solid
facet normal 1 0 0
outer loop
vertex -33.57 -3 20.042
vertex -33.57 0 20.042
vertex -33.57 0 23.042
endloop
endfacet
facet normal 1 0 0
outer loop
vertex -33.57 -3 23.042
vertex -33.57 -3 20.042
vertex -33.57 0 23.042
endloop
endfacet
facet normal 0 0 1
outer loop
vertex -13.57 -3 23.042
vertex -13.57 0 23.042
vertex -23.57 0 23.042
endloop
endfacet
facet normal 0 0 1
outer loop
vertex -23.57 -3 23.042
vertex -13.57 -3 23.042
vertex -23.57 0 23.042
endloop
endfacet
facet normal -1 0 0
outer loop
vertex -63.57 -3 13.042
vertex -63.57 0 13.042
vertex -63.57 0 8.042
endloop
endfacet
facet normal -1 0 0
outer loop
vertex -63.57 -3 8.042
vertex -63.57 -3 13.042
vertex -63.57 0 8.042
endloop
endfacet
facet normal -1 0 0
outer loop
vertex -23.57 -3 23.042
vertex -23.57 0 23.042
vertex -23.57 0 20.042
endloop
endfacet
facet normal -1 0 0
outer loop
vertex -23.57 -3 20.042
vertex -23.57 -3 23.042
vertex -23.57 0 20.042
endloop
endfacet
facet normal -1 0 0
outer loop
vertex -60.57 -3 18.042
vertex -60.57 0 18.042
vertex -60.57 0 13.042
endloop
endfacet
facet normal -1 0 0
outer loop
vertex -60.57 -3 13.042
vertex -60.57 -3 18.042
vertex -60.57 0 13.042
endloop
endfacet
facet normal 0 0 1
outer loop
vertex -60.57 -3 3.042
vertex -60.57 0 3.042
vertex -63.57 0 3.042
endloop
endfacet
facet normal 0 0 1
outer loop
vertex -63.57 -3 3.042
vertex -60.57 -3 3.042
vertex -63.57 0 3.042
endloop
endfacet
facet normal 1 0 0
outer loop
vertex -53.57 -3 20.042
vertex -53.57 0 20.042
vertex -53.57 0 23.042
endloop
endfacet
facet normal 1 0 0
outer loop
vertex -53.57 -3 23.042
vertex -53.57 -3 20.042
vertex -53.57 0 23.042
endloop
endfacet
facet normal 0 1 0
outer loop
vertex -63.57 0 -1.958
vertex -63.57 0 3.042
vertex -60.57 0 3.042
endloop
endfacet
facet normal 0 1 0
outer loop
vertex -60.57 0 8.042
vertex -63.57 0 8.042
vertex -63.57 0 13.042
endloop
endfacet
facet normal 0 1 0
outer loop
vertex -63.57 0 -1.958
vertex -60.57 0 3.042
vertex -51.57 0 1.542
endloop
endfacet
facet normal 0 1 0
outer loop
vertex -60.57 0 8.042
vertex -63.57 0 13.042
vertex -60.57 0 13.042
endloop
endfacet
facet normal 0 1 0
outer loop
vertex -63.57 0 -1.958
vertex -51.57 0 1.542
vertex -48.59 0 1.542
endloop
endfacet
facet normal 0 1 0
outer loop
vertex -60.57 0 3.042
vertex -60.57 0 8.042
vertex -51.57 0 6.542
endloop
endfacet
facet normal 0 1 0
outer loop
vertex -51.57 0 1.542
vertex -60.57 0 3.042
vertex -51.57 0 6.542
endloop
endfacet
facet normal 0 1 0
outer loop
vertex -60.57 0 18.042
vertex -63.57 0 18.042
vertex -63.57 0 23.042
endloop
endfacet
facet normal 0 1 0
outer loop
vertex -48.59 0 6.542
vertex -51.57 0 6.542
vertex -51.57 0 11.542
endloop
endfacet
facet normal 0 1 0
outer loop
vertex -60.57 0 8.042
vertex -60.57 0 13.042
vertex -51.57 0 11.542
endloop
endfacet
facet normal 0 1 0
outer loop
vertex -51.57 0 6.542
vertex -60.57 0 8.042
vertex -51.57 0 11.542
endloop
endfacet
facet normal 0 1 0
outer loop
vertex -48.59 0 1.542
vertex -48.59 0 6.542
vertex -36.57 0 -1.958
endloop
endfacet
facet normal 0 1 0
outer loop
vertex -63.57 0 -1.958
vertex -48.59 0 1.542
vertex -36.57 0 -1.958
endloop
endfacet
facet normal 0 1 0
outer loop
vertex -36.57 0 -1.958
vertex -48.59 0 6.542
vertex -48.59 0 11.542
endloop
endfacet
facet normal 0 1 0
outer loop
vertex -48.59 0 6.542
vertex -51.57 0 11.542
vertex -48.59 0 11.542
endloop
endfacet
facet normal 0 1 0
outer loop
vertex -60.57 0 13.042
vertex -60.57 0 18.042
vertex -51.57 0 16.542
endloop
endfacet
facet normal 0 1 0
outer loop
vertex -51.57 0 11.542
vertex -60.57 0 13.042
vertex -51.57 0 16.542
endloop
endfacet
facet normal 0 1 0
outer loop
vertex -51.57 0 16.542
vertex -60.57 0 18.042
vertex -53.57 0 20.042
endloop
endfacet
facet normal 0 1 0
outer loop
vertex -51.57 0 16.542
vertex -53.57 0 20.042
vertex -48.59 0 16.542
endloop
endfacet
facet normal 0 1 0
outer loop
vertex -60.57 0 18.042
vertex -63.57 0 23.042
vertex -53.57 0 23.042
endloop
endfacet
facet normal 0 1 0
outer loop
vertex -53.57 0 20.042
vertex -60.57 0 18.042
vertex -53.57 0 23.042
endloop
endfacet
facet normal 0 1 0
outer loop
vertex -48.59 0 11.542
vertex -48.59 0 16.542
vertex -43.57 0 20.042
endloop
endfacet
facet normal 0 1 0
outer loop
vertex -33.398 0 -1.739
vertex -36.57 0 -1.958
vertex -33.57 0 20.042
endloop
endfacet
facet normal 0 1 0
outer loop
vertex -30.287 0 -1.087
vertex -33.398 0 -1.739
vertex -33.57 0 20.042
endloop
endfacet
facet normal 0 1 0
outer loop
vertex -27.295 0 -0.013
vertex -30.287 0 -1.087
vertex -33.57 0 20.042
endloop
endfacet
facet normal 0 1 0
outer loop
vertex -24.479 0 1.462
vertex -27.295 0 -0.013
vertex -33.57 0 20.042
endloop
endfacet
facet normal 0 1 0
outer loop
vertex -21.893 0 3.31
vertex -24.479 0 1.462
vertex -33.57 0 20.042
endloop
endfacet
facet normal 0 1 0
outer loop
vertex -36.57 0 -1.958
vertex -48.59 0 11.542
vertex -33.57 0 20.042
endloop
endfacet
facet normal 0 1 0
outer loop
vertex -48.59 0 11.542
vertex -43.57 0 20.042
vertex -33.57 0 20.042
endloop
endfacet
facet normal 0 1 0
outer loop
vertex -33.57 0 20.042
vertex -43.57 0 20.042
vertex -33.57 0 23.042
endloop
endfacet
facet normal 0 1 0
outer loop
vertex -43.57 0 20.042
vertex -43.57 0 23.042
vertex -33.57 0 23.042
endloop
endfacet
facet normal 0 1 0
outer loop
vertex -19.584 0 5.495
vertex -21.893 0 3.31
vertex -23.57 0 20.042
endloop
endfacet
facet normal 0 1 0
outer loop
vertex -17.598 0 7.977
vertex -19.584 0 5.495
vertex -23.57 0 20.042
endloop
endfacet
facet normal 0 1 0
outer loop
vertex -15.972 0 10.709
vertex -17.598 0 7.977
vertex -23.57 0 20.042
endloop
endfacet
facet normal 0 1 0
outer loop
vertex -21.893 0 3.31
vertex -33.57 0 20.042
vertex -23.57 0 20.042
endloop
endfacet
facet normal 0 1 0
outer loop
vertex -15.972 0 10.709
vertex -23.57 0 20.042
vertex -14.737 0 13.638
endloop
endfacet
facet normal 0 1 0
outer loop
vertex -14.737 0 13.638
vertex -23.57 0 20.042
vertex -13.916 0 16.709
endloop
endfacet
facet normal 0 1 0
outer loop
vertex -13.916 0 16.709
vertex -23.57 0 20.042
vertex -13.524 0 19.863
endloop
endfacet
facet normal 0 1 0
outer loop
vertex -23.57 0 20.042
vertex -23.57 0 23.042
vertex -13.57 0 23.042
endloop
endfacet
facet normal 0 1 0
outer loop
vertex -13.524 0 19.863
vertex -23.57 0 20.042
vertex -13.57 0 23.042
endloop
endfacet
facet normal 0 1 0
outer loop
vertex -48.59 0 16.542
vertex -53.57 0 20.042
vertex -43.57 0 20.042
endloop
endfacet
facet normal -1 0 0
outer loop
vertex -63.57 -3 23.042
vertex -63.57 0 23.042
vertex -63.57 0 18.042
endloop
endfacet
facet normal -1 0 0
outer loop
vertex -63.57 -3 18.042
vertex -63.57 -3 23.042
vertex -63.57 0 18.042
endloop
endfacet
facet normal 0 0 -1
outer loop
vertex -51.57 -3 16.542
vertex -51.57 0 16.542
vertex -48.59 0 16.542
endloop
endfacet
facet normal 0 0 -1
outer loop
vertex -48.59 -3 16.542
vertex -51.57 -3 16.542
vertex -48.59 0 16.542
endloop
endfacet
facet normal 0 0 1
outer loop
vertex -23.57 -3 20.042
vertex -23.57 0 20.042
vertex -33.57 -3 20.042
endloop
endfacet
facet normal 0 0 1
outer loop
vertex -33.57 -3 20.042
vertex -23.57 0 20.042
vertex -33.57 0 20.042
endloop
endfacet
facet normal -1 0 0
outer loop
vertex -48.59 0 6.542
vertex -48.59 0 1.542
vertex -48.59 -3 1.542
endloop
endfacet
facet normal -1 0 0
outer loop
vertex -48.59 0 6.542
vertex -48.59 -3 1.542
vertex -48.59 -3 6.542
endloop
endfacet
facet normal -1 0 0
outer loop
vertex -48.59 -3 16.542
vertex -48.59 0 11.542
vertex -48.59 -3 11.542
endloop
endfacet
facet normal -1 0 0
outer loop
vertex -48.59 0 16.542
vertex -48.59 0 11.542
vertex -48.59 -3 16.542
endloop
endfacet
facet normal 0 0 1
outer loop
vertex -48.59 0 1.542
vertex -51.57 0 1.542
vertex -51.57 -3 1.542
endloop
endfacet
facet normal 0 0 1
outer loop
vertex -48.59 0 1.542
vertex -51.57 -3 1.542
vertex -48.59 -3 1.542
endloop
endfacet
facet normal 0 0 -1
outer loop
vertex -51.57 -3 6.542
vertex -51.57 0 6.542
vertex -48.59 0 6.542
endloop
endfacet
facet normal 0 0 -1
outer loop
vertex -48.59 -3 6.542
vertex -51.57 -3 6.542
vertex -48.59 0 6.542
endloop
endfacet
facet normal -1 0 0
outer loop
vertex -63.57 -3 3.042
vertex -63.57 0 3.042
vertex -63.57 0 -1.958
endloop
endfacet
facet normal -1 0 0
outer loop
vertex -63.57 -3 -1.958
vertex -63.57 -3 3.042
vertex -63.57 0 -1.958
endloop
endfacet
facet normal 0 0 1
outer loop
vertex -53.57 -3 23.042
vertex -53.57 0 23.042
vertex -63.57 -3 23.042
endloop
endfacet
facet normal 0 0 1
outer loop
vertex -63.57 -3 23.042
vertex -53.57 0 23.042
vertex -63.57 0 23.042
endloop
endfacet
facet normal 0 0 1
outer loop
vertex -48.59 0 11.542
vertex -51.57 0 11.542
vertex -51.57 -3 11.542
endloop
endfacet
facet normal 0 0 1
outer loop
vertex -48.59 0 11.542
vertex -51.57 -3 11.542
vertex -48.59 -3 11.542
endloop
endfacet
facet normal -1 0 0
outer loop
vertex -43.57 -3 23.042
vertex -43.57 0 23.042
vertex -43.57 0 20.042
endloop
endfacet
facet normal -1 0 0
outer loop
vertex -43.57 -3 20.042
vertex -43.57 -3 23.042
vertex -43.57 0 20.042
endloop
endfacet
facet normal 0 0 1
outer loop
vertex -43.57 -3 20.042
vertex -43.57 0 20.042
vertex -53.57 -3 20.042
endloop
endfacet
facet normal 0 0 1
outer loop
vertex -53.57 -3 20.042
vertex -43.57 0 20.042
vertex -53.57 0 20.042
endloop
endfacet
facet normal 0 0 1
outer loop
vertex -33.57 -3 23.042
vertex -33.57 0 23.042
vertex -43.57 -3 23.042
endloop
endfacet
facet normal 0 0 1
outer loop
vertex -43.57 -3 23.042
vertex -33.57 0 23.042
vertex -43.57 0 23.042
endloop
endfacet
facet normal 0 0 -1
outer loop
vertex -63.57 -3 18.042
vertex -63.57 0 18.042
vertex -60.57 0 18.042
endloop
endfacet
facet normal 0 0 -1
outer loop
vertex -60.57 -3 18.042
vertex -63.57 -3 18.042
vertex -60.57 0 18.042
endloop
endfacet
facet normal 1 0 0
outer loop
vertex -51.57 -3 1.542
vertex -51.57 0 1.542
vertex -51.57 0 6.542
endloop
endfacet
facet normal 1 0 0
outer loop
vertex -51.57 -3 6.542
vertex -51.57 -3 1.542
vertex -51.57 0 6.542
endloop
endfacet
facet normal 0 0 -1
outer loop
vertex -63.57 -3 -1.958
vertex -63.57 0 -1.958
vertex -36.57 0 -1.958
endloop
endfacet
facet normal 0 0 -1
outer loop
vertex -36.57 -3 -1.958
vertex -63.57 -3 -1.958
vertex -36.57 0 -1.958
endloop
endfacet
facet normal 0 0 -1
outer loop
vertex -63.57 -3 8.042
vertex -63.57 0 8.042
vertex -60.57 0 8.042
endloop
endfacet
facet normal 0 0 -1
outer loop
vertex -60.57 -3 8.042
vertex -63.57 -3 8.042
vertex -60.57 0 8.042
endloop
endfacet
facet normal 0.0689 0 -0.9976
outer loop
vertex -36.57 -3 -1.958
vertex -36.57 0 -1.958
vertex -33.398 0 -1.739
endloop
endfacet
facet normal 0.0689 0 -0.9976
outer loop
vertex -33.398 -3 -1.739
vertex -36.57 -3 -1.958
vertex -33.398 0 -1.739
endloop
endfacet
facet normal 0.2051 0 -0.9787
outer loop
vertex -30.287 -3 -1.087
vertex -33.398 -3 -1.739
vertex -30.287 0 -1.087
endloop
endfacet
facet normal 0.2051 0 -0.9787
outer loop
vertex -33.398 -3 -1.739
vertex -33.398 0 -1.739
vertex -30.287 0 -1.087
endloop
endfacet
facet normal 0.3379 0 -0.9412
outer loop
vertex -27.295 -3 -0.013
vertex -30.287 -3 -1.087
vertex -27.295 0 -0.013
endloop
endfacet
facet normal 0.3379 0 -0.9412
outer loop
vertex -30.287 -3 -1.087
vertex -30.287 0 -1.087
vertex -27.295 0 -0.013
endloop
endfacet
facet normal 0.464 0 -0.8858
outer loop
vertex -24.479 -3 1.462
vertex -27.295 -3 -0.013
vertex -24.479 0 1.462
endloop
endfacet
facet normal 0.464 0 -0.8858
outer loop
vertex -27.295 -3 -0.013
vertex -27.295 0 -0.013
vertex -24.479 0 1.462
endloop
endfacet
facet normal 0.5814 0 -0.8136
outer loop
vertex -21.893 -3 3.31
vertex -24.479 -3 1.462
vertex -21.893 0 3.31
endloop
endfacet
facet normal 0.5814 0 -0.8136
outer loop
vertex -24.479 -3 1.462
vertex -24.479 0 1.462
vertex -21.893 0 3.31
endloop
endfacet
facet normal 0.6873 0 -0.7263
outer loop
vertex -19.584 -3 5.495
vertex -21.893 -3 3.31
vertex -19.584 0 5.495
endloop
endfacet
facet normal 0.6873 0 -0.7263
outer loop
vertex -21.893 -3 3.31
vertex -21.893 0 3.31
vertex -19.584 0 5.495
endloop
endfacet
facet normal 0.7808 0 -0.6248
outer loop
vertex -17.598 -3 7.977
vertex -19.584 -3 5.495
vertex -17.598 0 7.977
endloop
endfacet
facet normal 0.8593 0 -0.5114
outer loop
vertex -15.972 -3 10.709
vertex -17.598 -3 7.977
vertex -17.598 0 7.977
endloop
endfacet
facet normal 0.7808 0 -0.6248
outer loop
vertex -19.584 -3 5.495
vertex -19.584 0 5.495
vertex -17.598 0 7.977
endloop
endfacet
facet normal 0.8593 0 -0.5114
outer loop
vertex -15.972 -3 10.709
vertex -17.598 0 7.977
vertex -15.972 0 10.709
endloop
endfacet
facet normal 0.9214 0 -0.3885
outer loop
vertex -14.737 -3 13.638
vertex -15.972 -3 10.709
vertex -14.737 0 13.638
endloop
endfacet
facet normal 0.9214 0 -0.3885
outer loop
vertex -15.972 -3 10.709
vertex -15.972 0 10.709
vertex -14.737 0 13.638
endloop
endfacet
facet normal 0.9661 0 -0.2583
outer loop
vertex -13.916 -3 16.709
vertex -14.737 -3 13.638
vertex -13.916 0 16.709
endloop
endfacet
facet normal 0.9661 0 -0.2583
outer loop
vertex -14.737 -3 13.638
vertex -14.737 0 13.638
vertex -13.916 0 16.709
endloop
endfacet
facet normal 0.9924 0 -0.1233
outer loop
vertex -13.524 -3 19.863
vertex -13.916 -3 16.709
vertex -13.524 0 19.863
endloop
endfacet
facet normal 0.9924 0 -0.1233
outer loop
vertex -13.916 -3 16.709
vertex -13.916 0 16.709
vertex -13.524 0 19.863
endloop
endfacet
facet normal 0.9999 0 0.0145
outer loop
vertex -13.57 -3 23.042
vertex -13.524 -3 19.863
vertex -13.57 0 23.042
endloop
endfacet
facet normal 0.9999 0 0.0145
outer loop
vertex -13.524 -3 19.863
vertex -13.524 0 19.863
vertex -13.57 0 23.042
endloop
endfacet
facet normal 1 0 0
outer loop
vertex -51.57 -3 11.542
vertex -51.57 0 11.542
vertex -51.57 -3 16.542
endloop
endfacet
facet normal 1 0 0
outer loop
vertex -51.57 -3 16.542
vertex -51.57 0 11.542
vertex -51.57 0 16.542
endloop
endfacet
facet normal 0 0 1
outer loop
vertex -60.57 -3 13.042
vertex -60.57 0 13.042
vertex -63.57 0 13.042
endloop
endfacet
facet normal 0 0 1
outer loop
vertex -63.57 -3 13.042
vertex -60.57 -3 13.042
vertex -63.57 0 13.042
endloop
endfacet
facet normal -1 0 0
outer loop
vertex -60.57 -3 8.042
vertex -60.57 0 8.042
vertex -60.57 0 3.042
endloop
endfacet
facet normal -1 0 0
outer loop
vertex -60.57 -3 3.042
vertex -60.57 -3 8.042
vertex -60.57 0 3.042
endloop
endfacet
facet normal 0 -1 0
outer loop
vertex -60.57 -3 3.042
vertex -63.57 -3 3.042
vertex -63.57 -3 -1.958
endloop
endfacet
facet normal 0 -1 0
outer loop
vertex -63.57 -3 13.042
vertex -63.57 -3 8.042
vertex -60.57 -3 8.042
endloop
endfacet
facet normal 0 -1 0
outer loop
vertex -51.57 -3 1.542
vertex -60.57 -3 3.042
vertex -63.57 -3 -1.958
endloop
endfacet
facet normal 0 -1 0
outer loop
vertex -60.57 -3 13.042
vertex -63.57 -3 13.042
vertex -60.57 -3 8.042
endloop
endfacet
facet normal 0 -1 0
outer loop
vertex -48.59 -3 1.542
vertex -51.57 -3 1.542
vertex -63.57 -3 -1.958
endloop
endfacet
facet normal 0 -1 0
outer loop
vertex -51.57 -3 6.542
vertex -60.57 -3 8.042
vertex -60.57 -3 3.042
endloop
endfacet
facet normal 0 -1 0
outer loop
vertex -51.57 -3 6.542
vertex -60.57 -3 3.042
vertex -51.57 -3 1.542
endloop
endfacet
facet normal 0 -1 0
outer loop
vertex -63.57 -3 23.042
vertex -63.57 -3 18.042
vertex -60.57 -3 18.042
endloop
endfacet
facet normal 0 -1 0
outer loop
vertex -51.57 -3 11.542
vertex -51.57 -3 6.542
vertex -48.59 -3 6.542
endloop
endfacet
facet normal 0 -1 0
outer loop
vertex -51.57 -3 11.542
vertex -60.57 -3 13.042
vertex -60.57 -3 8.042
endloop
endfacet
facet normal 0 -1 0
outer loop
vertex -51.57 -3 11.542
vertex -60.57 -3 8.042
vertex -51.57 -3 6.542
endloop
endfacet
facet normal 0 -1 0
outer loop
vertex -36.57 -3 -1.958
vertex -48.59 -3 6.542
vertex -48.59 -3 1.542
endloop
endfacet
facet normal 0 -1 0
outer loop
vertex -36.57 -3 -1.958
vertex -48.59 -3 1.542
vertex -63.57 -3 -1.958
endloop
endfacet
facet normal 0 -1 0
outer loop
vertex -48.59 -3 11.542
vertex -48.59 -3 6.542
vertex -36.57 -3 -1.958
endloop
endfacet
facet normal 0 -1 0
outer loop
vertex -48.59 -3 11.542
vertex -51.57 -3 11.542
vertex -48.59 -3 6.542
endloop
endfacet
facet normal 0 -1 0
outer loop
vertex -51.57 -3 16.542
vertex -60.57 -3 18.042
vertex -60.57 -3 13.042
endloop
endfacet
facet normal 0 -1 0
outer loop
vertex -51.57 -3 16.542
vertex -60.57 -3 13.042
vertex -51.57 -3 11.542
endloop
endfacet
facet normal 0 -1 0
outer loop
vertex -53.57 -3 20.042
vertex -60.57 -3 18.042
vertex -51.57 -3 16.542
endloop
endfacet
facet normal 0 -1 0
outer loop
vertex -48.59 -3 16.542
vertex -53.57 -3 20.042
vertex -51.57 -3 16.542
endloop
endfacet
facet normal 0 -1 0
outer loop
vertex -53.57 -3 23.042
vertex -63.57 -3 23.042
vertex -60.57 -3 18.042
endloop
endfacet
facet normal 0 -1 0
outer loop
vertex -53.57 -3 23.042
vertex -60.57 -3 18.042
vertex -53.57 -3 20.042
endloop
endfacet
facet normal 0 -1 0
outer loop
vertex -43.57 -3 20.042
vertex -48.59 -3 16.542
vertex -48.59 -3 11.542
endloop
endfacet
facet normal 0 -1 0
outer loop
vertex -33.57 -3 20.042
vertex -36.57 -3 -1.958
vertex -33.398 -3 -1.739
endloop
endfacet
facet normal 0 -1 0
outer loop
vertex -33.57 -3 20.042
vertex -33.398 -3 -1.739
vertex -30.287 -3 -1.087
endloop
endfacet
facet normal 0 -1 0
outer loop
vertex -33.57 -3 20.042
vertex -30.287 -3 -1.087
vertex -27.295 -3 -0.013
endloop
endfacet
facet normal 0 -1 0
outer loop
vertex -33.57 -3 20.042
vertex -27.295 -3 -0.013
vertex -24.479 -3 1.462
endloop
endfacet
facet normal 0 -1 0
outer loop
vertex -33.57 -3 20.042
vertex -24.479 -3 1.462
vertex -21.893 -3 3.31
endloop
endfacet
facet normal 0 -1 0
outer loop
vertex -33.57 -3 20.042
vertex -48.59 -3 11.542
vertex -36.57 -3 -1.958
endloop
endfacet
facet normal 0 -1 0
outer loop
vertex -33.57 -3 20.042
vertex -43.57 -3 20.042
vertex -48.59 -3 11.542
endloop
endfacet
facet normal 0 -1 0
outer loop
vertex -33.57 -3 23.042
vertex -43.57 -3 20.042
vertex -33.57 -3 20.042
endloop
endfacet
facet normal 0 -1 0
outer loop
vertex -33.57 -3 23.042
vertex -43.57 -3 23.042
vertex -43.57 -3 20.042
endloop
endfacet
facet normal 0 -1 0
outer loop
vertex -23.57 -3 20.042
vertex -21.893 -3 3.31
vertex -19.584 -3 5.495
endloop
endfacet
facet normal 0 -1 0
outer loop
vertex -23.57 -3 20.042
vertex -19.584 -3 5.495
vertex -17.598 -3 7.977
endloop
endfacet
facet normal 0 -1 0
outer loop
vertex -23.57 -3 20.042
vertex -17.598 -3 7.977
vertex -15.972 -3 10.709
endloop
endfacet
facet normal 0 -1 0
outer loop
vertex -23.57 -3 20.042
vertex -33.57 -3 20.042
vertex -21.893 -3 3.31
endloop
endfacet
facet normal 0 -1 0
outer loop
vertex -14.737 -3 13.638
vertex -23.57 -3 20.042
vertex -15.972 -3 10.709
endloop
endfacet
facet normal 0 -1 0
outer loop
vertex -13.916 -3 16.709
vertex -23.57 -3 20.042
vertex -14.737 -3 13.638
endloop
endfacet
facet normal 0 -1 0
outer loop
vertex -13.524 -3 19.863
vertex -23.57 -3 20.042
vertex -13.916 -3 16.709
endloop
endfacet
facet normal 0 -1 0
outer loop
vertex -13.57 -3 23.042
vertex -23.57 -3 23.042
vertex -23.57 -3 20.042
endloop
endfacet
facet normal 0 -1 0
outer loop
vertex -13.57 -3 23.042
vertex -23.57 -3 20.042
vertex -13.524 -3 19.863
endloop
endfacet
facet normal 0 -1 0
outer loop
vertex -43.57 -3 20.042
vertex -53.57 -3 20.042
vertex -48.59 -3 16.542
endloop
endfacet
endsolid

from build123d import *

# Parameters (mm, degrees)
F0_W     = 2.98
F0_H     = 5
F1_DEPTH = 3


with BuildPart() as f1:
    # F0 (on Front) → F1 (new body)
    with BuildSketch(Plane.XZ):
        with BuildLine():
            Line((-63.569787, -1.958204), (-36.56974, -1.958204))
            ThreePointArc((-36.56974, -1.958204), (-19.584468, 5.495335), (-13.569787, 23.041796))
            Line((-13.569787, 23.041796), (-23.569787, 23.041796))
            Line((-23.569787, 23.041796), (-23.569787, 20.041796))
            Line((-23.569787, 20.041796), (-33.569787, 20.041796))
            Line((-33.569787, 20.041796), (-33.569787, 23.041796))
            Line((-33.569787, 23.041796), (-43.569787, 23.041796))
            Line((-43.569787, 23.041796), (-43.569787, 20.041796))
            Line((-43.569787, 20.041796), (-53.569787, 20.041796))
            Line((-53.569787, 20.041796), (-53.569787, 23.041796))
            Line((-53.569787, 23.041796), (-63.569787, 23.041796))
            Line((-63.569787, 23.041796), (-63.569787, 18.041796))
            Line((-63.569787, 18.041796), (-60.569787, 18.041796))
            Line((-60.569787, 18.041796), (-60.569787, 13.041796))
            Line((-60.569787, 13.041796), (-63.569787, 13.041796))
            Line((-63.569787, 13.041796), (-63.569787, 8.041796))
            Line((-63.569787, 8.041796), (-60.569787, 8.041796))
            Line((-60.569787, 8.041796), (-60.569787, 3.041796))
            Line((-60.569787, 3.041796), (-63.569787, 3.041796))
            Line((-63.569787, 3.041796), (-63.569787, -1.958204))
        make_face()
        with Locations((-50.079787, 4.041796)):
            Rectangle(F0_W, F0_H, mode=Mode.SUBTRACT)
        with Locations((-50.079787, 14.041796)):
            Rectangle(F0_W, F0_H, mode=Mode.SUBTRACT)
    extrude(amount=F1_DEPTH)


solid = f1.part
